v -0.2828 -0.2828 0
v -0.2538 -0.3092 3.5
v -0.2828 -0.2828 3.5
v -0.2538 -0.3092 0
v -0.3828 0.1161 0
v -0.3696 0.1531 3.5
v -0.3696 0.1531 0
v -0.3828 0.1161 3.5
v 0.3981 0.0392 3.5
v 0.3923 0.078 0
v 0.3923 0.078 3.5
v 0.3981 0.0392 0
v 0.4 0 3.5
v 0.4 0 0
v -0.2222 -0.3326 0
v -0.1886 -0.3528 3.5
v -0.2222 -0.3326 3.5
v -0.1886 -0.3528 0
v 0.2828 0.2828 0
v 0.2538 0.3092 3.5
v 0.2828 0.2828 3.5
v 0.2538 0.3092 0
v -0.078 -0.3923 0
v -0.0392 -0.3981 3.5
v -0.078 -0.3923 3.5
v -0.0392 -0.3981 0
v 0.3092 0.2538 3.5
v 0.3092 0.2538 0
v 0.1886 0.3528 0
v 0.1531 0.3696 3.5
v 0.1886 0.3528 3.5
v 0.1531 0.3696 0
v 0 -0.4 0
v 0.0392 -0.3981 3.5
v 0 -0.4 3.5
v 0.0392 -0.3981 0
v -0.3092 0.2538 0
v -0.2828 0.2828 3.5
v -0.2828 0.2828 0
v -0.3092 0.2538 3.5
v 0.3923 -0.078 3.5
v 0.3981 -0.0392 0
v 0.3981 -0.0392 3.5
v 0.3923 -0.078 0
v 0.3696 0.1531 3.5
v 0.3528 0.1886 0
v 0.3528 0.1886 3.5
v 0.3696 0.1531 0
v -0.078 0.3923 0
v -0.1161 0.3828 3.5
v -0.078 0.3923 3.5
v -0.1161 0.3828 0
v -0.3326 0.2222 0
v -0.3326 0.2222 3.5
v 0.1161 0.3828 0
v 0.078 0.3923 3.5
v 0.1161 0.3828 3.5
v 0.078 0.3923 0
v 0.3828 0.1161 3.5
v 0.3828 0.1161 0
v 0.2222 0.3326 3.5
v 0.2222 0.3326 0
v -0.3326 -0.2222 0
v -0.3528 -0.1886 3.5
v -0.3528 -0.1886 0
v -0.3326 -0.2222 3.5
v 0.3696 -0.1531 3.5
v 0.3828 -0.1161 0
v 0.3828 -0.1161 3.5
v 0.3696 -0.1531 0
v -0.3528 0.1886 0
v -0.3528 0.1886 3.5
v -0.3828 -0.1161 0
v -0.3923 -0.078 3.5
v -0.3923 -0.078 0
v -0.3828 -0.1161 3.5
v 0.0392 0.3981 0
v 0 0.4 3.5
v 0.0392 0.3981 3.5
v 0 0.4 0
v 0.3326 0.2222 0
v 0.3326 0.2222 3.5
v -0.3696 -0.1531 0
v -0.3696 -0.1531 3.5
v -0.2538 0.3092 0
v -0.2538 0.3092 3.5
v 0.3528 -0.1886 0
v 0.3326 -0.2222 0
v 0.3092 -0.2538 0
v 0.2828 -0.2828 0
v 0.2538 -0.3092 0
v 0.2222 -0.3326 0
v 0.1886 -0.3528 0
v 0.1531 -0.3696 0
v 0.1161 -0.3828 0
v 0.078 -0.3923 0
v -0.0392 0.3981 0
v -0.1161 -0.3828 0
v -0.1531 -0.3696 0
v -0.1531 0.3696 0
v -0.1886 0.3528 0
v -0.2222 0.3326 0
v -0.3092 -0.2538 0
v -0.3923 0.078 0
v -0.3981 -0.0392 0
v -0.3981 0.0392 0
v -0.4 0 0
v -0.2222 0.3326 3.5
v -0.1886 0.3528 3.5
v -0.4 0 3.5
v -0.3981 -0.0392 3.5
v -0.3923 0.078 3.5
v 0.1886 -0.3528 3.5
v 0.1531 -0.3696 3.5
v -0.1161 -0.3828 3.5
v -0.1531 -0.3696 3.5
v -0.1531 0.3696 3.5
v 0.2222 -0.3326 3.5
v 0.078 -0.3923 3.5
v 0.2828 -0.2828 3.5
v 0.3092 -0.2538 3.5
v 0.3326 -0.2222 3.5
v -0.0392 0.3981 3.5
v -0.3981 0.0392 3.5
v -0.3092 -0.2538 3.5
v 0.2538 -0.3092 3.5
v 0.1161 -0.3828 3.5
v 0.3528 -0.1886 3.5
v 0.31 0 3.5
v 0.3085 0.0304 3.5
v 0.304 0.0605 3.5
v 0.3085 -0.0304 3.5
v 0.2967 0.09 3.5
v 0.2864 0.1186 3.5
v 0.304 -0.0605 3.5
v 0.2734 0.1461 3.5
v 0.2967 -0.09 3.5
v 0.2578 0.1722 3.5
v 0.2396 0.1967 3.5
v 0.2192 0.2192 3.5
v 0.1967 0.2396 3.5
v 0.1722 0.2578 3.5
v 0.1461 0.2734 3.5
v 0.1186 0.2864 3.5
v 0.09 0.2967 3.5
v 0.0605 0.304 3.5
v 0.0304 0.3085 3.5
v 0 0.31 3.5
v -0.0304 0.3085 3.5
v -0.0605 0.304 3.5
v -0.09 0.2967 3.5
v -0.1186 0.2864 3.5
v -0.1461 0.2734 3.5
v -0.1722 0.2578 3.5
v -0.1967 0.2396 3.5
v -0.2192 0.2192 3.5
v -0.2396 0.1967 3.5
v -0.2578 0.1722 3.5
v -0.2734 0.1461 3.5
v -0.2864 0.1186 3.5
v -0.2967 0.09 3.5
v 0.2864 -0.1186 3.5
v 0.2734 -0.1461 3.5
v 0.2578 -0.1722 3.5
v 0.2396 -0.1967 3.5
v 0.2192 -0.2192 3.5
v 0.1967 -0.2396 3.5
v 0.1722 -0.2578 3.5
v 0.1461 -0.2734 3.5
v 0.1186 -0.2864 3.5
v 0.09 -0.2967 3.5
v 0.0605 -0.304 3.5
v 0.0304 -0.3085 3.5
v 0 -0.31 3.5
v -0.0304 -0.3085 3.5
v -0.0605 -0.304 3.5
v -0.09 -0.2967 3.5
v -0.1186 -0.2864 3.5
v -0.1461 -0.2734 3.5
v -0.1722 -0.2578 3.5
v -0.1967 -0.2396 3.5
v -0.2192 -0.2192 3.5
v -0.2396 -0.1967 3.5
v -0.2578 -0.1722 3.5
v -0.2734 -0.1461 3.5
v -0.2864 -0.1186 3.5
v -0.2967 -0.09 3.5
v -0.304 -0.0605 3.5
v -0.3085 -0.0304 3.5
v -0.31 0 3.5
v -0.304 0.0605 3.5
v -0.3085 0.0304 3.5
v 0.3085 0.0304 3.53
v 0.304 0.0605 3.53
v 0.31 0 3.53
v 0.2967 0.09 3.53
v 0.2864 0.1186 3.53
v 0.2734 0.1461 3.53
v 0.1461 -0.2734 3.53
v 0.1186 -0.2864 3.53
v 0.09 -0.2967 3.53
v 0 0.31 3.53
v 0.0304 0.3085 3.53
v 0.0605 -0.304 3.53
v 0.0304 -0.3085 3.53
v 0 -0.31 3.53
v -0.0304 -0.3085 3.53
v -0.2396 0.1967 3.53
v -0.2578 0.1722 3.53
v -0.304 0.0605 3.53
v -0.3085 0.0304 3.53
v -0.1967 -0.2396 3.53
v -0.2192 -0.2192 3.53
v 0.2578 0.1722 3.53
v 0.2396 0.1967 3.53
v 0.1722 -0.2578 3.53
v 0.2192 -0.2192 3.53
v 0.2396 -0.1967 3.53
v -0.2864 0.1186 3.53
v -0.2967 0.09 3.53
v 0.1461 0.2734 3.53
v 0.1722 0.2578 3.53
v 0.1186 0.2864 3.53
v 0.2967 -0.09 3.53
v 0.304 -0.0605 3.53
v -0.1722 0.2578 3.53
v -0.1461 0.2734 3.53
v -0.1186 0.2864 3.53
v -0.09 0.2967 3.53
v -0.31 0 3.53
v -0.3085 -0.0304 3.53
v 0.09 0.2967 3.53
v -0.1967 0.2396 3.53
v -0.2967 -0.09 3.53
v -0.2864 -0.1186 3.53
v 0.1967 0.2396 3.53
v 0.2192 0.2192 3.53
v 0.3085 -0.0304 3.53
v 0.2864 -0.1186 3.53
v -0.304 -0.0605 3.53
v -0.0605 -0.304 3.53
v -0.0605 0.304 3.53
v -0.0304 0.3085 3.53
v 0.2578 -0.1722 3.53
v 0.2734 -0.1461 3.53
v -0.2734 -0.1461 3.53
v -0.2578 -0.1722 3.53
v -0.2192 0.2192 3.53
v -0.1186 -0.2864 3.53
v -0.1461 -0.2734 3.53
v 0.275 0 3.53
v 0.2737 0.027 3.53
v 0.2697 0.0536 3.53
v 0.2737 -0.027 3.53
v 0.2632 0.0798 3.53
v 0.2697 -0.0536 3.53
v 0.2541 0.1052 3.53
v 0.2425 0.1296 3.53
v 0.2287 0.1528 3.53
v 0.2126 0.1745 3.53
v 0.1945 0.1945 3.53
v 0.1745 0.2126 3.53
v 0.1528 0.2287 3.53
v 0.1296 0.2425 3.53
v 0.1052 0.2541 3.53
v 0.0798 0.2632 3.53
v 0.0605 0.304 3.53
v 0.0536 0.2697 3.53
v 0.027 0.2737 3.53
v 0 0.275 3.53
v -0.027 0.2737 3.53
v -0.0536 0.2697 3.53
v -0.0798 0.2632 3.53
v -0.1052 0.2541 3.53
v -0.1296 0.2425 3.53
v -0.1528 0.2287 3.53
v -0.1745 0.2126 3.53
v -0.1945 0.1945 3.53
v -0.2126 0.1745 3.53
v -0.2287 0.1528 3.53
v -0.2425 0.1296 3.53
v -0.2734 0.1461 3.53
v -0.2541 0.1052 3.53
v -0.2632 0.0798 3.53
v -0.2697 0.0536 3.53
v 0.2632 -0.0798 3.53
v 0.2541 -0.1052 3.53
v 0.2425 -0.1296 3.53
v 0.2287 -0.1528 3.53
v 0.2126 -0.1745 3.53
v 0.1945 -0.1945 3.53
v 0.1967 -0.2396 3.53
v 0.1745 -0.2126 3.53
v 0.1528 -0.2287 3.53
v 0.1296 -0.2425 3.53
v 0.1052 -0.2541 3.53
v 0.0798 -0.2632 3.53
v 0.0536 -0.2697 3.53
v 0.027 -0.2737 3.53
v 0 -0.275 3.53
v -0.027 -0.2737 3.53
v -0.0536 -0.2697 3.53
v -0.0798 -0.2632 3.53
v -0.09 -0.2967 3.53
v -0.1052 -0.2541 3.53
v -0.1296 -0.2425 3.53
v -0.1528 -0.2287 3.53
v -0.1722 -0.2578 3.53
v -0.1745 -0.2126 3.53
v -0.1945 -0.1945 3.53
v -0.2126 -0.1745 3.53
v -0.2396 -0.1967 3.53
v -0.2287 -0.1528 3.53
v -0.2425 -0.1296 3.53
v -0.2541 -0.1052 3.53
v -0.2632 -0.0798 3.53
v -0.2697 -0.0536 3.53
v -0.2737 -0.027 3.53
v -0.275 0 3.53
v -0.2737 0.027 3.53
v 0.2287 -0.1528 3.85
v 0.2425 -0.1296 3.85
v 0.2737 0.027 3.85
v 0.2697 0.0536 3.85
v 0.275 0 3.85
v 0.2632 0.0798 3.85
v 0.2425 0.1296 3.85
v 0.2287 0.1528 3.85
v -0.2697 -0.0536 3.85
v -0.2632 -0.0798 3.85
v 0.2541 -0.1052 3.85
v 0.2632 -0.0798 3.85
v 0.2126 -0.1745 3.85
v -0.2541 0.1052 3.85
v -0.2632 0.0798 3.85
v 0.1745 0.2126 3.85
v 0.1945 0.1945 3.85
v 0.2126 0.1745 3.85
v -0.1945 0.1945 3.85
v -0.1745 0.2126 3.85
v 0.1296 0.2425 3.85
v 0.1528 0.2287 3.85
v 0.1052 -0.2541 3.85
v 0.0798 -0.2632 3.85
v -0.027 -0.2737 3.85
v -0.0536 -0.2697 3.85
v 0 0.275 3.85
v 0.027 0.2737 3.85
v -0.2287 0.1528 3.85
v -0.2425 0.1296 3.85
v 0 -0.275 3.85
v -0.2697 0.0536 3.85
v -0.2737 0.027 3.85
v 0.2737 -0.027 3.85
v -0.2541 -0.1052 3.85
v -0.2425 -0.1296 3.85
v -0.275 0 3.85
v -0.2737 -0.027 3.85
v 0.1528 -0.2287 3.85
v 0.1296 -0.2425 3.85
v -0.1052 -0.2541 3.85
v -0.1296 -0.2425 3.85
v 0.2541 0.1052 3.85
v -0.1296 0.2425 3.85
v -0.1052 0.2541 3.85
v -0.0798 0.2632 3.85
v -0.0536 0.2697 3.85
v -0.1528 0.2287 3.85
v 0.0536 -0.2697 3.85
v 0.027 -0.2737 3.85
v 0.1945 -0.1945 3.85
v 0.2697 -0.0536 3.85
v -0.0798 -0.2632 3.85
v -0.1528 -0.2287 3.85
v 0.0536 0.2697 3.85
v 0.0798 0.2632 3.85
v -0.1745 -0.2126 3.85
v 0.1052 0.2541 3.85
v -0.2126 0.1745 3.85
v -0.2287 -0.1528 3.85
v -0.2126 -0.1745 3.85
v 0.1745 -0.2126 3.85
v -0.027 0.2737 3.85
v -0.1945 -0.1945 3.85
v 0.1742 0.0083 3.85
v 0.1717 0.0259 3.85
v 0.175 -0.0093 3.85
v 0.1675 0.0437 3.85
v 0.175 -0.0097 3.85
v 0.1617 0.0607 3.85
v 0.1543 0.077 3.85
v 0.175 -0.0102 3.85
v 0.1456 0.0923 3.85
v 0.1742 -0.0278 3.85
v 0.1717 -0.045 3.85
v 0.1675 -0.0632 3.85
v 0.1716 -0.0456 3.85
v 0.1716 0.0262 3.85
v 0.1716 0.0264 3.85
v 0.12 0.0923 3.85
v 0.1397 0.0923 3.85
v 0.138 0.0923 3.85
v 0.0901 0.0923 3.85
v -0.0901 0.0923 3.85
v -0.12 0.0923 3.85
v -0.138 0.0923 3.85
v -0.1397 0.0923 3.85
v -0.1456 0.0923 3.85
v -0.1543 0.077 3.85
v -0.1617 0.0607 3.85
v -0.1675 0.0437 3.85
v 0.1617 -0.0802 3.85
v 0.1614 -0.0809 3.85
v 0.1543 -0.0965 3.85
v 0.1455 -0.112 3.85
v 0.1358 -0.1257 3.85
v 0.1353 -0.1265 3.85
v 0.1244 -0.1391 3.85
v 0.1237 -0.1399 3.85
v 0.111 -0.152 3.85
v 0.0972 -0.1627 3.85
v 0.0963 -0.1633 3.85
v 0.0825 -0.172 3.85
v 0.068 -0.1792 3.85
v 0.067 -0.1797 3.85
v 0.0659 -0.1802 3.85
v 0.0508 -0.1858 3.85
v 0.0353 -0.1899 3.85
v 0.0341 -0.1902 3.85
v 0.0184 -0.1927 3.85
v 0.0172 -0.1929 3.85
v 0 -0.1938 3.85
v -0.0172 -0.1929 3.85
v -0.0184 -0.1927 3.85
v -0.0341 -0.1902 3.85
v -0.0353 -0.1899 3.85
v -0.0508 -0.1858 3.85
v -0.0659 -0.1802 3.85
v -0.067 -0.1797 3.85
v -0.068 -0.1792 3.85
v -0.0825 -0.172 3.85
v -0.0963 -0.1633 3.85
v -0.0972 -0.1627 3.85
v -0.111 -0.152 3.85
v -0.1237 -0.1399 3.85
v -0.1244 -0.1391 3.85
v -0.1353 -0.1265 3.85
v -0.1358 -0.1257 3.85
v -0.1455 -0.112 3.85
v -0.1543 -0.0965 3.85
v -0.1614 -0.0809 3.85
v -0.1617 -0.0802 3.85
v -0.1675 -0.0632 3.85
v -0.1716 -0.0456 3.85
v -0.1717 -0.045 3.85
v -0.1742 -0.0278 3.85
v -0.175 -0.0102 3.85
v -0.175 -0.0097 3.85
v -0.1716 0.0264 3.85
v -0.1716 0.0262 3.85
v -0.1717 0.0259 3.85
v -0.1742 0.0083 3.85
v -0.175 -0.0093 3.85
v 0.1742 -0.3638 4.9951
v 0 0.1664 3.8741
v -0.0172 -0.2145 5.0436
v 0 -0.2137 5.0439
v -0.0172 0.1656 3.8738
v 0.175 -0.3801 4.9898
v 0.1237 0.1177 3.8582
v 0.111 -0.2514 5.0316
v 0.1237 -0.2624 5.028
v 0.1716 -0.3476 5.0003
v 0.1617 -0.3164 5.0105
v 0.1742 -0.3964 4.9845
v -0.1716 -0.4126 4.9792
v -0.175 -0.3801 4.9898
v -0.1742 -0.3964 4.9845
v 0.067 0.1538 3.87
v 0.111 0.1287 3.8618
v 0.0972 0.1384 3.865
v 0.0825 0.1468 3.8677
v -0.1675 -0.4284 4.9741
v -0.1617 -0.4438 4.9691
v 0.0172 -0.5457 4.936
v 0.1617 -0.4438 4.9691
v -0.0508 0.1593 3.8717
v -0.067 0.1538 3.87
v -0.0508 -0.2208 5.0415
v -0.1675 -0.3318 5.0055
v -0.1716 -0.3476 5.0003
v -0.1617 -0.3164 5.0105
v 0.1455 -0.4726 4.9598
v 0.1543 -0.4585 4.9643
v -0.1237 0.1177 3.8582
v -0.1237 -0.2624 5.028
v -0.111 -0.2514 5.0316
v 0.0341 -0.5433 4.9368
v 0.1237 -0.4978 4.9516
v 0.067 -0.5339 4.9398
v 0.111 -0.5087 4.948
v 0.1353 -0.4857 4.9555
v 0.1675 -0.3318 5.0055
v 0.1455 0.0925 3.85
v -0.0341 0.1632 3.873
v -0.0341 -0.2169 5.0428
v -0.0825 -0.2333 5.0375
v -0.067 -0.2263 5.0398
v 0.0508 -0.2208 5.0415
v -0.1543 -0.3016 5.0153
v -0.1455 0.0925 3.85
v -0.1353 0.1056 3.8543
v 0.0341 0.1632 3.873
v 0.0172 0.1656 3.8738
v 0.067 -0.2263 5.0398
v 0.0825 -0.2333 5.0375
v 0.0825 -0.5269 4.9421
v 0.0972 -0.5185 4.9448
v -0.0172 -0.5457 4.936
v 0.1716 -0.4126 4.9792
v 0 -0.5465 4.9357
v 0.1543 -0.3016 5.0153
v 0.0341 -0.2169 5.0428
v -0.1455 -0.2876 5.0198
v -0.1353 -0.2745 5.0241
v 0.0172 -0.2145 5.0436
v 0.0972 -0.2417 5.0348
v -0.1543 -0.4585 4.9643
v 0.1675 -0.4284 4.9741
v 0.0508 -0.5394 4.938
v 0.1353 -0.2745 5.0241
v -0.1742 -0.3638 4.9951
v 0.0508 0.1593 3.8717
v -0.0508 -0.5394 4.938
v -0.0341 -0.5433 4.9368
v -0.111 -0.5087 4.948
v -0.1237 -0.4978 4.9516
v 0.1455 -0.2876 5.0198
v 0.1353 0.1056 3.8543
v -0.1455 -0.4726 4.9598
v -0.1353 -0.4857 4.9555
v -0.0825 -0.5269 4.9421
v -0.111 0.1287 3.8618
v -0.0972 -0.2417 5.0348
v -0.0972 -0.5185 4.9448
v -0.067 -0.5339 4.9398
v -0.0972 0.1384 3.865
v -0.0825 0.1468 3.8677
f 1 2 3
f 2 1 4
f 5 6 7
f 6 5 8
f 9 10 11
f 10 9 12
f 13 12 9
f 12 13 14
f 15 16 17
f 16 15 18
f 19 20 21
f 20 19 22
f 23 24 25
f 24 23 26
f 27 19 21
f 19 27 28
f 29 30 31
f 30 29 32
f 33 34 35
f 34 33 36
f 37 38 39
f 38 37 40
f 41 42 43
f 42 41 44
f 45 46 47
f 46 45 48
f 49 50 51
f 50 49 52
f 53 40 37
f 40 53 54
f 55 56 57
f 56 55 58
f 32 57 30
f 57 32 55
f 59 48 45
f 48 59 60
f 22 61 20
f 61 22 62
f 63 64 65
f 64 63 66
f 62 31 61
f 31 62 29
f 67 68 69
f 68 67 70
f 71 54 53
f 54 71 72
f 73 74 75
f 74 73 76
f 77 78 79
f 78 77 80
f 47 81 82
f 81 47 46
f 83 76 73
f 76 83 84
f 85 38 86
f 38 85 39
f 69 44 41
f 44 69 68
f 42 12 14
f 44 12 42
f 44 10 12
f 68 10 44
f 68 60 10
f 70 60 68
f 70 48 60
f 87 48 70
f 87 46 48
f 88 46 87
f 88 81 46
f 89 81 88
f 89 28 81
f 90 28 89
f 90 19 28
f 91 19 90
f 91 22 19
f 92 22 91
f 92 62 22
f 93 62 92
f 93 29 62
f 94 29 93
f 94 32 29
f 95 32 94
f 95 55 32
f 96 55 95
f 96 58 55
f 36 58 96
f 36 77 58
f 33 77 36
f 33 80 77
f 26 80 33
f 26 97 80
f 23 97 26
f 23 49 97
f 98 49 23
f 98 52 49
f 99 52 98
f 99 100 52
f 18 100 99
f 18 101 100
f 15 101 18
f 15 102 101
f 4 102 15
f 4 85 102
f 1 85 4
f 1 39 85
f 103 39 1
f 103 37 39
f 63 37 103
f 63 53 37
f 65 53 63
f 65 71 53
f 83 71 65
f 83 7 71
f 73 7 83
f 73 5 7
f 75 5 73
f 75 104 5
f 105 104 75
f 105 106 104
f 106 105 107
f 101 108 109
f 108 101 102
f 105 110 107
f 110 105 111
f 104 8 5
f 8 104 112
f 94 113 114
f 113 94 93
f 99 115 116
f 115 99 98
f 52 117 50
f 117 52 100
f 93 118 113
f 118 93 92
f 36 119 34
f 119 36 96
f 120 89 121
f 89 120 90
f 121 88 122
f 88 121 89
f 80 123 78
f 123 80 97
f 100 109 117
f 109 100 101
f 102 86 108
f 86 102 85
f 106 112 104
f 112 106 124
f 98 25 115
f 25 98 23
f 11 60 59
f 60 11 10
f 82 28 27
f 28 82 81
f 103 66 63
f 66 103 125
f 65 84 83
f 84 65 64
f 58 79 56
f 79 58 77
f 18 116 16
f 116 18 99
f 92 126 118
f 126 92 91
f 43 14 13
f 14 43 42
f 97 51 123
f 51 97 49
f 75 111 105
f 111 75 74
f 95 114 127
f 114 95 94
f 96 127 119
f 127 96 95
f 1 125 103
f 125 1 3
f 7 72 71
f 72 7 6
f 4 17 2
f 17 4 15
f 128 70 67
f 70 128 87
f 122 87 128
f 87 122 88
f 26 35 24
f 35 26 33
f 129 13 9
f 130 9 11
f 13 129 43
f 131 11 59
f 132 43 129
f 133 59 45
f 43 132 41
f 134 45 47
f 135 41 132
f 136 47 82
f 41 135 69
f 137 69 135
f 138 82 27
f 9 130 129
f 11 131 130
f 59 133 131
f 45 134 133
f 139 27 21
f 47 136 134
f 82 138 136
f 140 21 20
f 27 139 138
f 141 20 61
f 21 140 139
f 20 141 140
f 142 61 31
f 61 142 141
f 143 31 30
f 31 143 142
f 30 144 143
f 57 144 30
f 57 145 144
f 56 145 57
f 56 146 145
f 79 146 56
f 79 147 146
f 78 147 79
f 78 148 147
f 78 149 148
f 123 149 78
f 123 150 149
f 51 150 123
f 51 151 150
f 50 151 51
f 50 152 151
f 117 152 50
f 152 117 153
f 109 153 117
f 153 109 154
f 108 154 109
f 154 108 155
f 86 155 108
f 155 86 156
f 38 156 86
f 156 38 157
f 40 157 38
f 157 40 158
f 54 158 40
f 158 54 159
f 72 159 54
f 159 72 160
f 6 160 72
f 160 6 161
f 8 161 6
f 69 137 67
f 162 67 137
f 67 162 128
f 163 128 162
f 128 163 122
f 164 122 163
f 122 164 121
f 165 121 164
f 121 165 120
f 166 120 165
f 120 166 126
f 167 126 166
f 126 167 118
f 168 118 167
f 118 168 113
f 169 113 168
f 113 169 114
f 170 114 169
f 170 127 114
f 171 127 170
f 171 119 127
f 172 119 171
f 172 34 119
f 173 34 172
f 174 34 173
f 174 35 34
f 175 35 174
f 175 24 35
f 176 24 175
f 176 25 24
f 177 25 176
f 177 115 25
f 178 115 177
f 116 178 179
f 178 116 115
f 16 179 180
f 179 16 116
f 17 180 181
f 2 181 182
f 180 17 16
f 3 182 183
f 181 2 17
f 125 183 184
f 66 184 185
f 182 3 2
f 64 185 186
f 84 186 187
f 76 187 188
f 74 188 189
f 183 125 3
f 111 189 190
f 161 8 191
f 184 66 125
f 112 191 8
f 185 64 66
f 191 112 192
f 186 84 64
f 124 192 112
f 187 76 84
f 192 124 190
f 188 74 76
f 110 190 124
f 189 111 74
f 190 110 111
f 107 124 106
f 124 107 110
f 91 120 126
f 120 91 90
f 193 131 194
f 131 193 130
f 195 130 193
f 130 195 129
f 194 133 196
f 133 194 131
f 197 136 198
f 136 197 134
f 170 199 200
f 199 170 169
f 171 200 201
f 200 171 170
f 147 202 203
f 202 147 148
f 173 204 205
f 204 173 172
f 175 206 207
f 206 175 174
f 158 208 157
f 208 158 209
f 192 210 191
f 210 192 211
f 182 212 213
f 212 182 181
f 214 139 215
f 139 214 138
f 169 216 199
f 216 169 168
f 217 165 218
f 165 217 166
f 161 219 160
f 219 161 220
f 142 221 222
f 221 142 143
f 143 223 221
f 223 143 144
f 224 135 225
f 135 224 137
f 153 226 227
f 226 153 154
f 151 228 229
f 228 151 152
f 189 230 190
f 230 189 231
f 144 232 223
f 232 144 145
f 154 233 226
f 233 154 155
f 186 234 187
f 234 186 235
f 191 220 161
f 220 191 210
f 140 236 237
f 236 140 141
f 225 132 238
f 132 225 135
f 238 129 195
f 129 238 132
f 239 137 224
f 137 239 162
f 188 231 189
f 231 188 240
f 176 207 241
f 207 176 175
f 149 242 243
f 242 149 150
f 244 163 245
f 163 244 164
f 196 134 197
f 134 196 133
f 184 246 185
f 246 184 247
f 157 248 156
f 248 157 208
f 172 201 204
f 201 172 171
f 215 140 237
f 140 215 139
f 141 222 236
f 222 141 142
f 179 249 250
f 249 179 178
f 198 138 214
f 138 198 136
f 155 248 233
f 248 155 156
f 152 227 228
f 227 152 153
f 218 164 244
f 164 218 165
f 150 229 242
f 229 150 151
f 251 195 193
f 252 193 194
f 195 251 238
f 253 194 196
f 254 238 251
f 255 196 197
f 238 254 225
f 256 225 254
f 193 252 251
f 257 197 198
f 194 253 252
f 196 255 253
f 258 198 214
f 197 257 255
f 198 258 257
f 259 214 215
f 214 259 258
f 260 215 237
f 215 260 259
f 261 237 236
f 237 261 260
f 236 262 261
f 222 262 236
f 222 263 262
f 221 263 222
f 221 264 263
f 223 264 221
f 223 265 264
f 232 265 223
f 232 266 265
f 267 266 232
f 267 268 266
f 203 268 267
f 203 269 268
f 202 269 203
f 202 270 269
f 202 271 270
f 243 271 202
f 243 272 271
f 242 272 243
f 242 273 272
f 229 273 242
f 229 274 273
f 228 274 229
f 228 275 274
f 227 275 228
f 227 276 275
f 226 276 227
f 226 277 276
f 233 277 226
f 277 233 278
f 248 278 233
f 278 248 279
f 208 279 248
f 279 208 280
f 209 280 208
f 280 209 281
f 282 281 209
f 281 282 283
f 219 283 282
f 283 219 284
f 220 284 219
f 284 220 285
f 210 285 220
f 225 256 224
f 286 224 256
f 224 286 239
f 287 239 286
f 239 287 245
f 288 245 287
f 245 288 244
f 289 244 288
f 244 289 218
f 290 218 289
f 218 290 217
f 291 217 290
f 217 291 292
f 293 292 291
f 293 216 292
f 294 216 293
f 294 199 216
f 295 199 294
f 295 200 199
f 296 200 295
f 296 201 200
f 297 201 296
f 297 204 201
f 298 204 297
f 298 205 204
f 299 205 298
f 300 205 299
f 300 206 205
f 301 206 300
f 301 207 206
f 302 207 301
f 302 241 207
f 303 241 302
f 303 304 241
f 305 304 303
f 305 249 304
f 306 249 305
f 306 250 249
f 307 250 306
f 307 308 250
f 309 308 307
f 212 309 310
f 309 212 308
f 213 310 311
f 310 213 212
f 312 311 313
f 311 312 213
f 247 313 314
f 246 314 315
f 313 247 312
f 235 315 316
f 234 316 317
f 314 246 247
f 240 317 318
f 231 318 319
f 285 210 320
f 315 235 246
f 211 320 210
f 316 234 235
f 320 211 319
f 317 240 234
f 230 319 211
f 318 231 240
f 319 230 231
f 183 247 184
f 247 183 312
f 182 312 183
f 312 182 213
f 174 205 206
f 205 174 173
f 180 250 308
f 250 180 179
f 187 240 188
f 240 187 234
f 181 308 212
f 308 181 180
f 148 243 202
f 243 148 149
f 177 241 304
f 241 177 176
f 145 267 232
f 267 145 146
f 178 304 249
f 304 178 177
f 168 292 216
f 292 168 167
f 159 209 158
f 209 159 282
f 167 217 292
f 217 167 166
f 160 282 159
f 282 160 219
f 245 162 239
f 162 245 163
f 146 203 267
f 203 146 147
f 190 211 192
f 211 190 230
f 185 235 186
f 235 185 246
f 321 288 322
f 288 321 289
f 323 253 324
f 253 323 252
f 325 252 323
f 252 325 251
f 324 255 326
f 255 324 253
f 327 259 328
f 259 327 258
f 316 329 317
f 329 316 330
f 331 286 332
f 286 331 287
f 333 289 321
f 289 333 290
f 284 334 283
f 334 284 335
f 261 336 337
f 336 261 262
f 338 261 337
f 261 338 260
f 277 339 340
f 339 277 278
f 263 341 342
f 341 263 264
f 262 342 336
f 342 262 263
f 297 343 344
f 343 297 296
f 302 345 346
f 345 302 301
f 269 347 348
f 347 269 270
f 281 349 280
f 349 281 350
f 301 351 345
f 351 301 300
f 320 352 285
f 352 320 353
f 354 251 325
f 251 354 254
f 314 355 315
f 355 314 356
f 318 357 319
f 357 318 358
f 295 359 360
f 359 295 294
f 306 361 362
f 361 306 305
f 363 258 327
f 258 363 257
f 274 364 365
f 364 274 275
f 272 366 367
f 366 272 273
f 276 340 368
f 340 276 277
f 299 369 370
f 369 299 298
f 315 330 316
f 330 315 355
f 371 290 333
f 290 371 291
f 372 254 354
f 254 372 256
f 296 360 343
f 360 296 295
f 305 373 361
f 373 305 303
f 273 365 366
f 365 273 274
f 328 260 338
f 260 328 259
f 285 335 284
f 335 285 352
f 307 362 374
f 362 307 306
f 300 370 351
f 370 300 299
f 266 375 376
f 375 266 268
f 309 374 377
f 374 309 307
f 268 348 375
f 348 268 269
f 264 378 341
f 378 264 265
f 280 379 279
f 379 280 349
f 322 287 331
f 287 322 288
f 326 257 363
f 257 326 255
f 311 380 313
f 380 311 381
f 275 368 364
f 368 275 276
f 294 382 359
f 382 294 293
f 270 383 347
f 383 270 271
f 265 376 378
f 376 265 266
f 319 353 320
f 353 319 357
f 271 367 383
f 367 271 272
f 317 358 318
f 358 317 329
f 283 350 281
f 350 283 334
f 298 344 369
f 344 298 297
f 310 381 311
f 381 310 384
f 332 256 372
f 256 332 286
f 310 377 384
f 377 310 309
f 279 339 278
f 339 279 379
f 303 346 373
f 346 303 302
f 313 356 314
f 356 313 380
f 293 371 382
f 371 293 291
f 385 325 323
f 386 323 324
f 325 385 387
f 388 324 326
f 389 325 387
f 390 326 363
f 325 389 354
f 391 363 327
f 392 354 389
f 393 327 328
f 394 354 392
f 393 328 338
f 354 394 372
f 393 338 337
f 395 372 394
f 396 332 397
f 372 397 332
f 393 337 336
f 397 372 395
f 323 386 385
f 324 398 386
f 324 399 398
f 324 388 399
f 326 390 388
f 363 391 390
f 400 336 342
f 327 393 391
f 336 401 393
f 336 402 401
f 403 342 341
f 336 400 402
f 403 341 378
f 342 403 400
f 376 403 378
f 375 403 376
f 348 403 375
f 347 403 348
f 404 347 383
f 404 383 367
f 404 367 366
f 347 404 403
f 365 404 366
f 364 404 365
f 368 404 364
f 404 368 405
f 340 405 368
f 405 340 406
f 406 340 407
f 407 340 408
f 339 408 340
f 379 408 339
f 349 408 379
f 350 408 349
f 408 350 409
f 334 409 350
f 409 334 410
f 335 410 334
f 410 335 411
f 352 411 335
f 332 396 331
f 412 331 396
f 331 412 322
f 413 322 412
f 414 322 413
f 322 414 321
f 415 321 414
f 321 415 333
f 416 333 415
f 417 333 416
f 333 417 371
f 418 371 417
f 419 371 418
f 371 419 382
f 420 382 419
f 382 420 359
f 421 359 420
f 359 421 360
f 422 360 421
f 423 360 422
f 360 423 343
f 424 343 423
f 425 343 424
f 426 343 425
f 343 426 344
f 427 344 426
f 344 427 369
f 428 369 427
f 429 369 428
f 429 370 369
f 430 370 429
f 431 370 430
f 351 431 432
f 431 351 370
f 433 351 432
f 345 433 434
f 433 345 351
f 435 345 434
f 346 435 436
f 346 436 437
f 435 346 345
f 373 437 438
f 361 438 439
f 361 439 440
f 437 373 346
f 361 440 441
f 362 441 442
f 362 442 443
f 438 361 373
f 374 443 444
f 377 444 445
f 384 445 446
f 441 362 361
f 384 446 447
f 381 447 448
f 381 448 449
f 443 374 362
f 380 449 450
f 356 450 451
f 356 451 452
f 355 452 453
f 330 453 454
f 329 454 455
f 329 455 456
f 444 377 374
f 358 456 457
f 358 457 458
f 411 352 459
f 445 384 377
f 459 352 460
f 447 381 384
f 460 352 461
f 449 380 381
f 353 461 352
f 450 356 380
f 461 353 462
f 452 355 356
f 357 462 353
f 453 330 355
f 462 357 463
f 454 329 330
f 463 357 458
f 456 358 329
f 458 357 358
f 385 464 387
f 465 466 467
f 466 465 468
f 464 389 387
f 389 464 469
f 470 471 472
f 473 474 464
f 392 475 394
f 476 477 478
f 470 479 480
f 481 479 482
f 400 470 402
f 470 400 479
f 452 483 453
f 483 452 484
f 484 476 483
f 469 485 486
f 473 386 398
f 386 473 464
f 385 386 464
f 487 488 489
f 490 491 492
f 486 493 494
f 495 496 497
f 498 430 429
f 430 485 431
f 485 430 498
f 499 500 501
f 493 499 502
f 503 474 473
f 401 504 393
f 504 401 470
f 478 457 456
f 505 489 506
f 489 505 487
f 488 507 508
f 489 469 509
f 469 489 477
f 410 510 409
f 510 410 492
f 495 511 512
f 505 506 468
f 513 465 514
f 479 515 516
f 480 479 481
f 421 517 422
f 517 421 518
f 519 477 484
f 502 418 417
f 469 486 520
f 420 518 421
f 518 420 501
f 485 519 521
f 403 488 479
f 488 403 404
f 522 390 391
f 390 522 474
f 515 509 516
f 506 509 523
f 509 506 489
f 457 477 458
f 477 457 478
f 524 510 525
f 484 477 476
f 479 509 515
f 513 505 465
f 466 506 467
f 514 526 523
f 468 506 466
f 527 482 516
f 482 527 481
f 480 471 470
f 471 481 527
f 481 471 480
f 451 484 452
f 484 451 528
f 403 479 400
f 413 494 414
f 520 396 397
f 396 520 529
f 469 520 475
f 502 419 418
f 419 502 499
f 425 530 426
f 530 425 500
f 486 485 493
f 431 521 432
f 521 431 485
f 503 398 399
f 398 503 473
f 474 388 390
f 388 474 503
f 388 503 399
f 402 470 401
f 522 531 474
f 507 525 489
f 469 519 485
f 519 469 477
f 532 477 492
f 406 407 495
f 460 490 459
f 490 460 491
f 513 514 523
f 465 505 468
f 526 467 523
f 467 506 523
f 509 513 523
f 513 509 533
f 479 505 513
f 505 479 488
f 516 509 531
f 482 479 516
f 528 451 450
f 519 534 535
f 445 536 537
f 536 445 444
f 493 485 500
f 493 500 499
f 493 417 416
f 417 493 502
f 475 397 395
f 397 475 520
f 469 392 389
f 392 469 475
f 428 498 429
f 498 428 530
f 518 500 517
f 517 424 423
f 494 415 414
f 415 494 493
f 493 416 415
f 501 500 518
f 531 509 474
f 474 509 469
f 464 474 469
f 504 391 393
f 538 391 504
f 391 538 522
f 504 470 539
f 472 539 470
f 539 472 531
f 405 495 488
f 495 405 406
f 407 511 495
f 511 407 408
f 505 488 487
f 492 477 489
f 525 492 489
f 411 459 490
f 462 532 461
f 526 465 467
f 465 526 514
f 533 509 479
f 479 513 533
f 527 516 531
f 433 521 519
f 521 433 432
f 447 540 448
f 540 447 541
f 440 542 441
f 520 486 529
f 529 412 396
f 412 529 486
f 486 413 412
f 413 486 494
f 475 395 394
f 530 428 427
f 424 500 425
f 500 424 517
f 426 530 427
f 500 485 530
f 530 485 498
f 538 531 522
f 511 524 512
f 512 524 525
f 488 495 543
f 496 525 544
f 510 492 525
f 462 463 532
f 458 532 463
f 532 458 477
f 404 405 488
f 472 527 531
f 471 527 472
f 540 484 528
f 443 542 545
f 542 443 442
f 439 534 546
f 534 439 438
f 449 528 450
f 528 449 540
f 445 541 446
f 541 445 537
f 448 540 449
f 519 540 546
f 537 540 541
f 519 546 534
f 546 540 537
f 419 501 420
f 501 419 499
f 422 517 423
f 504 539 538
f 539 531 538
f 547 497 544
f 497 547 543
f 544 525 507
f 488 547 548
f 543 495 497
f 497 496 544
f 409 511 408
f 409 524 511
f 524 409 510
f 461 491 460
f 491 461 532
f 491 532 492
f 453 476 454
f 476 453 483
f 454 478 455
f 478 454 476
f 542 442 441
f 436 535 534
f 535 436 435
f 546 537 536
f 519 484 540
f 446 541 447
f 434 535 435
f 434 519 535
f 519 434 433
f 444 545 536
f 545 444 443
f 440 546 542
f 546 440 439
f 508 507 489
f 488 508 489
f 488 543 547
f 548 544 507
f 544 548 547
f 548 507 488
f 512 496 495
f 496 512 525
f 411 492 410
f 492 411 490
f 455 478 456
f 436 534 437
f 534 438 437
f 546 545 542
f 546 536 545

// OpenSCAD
$fn = 64;

// Target overall: 0.8mm body diameter, 4.7mm tall (including lever)
body_d = 0.8;
total_h = 4.7;

// Simple toggle details (kept small but visible)
lever_d = 0.35;
lever_h = 1.2;

bushing_d = 0.55;
bushing_h = 0.35;

collar_d = 0.62;
collar_h = 0.25;

body_h = total_h - lever_h;  // ensures exact total height

// Small overlap to guarantee one connected solid
ov = 0.03;

module toggle_switch() {
    union() {
        // Main cylindrical body (base at z=0)
        cylinder(h = body_h, d = body_d, center = false);

        // Small collar near top of body (adds switch-like detail)
        translate([0, 0, body_h - collar_h])
            cylinder(h = collar_h + ov, d = collar_d, center = false);

        // Bushing/neck above body (connects to lever)
        translate([0, 0, body_h - ov])
            cylinder(h = bushing_h + ov, d = bushing_d, center = false);

        // Toggle lever: slightly tilted, rooted in bushing
        translate([0, 0, body_h + bushing_h - ov])
            rotate([18, 0, 0])
                cylinder(h = lever_h + ov, d = lever_d, center = false);
    }
}

toggle_switch();
